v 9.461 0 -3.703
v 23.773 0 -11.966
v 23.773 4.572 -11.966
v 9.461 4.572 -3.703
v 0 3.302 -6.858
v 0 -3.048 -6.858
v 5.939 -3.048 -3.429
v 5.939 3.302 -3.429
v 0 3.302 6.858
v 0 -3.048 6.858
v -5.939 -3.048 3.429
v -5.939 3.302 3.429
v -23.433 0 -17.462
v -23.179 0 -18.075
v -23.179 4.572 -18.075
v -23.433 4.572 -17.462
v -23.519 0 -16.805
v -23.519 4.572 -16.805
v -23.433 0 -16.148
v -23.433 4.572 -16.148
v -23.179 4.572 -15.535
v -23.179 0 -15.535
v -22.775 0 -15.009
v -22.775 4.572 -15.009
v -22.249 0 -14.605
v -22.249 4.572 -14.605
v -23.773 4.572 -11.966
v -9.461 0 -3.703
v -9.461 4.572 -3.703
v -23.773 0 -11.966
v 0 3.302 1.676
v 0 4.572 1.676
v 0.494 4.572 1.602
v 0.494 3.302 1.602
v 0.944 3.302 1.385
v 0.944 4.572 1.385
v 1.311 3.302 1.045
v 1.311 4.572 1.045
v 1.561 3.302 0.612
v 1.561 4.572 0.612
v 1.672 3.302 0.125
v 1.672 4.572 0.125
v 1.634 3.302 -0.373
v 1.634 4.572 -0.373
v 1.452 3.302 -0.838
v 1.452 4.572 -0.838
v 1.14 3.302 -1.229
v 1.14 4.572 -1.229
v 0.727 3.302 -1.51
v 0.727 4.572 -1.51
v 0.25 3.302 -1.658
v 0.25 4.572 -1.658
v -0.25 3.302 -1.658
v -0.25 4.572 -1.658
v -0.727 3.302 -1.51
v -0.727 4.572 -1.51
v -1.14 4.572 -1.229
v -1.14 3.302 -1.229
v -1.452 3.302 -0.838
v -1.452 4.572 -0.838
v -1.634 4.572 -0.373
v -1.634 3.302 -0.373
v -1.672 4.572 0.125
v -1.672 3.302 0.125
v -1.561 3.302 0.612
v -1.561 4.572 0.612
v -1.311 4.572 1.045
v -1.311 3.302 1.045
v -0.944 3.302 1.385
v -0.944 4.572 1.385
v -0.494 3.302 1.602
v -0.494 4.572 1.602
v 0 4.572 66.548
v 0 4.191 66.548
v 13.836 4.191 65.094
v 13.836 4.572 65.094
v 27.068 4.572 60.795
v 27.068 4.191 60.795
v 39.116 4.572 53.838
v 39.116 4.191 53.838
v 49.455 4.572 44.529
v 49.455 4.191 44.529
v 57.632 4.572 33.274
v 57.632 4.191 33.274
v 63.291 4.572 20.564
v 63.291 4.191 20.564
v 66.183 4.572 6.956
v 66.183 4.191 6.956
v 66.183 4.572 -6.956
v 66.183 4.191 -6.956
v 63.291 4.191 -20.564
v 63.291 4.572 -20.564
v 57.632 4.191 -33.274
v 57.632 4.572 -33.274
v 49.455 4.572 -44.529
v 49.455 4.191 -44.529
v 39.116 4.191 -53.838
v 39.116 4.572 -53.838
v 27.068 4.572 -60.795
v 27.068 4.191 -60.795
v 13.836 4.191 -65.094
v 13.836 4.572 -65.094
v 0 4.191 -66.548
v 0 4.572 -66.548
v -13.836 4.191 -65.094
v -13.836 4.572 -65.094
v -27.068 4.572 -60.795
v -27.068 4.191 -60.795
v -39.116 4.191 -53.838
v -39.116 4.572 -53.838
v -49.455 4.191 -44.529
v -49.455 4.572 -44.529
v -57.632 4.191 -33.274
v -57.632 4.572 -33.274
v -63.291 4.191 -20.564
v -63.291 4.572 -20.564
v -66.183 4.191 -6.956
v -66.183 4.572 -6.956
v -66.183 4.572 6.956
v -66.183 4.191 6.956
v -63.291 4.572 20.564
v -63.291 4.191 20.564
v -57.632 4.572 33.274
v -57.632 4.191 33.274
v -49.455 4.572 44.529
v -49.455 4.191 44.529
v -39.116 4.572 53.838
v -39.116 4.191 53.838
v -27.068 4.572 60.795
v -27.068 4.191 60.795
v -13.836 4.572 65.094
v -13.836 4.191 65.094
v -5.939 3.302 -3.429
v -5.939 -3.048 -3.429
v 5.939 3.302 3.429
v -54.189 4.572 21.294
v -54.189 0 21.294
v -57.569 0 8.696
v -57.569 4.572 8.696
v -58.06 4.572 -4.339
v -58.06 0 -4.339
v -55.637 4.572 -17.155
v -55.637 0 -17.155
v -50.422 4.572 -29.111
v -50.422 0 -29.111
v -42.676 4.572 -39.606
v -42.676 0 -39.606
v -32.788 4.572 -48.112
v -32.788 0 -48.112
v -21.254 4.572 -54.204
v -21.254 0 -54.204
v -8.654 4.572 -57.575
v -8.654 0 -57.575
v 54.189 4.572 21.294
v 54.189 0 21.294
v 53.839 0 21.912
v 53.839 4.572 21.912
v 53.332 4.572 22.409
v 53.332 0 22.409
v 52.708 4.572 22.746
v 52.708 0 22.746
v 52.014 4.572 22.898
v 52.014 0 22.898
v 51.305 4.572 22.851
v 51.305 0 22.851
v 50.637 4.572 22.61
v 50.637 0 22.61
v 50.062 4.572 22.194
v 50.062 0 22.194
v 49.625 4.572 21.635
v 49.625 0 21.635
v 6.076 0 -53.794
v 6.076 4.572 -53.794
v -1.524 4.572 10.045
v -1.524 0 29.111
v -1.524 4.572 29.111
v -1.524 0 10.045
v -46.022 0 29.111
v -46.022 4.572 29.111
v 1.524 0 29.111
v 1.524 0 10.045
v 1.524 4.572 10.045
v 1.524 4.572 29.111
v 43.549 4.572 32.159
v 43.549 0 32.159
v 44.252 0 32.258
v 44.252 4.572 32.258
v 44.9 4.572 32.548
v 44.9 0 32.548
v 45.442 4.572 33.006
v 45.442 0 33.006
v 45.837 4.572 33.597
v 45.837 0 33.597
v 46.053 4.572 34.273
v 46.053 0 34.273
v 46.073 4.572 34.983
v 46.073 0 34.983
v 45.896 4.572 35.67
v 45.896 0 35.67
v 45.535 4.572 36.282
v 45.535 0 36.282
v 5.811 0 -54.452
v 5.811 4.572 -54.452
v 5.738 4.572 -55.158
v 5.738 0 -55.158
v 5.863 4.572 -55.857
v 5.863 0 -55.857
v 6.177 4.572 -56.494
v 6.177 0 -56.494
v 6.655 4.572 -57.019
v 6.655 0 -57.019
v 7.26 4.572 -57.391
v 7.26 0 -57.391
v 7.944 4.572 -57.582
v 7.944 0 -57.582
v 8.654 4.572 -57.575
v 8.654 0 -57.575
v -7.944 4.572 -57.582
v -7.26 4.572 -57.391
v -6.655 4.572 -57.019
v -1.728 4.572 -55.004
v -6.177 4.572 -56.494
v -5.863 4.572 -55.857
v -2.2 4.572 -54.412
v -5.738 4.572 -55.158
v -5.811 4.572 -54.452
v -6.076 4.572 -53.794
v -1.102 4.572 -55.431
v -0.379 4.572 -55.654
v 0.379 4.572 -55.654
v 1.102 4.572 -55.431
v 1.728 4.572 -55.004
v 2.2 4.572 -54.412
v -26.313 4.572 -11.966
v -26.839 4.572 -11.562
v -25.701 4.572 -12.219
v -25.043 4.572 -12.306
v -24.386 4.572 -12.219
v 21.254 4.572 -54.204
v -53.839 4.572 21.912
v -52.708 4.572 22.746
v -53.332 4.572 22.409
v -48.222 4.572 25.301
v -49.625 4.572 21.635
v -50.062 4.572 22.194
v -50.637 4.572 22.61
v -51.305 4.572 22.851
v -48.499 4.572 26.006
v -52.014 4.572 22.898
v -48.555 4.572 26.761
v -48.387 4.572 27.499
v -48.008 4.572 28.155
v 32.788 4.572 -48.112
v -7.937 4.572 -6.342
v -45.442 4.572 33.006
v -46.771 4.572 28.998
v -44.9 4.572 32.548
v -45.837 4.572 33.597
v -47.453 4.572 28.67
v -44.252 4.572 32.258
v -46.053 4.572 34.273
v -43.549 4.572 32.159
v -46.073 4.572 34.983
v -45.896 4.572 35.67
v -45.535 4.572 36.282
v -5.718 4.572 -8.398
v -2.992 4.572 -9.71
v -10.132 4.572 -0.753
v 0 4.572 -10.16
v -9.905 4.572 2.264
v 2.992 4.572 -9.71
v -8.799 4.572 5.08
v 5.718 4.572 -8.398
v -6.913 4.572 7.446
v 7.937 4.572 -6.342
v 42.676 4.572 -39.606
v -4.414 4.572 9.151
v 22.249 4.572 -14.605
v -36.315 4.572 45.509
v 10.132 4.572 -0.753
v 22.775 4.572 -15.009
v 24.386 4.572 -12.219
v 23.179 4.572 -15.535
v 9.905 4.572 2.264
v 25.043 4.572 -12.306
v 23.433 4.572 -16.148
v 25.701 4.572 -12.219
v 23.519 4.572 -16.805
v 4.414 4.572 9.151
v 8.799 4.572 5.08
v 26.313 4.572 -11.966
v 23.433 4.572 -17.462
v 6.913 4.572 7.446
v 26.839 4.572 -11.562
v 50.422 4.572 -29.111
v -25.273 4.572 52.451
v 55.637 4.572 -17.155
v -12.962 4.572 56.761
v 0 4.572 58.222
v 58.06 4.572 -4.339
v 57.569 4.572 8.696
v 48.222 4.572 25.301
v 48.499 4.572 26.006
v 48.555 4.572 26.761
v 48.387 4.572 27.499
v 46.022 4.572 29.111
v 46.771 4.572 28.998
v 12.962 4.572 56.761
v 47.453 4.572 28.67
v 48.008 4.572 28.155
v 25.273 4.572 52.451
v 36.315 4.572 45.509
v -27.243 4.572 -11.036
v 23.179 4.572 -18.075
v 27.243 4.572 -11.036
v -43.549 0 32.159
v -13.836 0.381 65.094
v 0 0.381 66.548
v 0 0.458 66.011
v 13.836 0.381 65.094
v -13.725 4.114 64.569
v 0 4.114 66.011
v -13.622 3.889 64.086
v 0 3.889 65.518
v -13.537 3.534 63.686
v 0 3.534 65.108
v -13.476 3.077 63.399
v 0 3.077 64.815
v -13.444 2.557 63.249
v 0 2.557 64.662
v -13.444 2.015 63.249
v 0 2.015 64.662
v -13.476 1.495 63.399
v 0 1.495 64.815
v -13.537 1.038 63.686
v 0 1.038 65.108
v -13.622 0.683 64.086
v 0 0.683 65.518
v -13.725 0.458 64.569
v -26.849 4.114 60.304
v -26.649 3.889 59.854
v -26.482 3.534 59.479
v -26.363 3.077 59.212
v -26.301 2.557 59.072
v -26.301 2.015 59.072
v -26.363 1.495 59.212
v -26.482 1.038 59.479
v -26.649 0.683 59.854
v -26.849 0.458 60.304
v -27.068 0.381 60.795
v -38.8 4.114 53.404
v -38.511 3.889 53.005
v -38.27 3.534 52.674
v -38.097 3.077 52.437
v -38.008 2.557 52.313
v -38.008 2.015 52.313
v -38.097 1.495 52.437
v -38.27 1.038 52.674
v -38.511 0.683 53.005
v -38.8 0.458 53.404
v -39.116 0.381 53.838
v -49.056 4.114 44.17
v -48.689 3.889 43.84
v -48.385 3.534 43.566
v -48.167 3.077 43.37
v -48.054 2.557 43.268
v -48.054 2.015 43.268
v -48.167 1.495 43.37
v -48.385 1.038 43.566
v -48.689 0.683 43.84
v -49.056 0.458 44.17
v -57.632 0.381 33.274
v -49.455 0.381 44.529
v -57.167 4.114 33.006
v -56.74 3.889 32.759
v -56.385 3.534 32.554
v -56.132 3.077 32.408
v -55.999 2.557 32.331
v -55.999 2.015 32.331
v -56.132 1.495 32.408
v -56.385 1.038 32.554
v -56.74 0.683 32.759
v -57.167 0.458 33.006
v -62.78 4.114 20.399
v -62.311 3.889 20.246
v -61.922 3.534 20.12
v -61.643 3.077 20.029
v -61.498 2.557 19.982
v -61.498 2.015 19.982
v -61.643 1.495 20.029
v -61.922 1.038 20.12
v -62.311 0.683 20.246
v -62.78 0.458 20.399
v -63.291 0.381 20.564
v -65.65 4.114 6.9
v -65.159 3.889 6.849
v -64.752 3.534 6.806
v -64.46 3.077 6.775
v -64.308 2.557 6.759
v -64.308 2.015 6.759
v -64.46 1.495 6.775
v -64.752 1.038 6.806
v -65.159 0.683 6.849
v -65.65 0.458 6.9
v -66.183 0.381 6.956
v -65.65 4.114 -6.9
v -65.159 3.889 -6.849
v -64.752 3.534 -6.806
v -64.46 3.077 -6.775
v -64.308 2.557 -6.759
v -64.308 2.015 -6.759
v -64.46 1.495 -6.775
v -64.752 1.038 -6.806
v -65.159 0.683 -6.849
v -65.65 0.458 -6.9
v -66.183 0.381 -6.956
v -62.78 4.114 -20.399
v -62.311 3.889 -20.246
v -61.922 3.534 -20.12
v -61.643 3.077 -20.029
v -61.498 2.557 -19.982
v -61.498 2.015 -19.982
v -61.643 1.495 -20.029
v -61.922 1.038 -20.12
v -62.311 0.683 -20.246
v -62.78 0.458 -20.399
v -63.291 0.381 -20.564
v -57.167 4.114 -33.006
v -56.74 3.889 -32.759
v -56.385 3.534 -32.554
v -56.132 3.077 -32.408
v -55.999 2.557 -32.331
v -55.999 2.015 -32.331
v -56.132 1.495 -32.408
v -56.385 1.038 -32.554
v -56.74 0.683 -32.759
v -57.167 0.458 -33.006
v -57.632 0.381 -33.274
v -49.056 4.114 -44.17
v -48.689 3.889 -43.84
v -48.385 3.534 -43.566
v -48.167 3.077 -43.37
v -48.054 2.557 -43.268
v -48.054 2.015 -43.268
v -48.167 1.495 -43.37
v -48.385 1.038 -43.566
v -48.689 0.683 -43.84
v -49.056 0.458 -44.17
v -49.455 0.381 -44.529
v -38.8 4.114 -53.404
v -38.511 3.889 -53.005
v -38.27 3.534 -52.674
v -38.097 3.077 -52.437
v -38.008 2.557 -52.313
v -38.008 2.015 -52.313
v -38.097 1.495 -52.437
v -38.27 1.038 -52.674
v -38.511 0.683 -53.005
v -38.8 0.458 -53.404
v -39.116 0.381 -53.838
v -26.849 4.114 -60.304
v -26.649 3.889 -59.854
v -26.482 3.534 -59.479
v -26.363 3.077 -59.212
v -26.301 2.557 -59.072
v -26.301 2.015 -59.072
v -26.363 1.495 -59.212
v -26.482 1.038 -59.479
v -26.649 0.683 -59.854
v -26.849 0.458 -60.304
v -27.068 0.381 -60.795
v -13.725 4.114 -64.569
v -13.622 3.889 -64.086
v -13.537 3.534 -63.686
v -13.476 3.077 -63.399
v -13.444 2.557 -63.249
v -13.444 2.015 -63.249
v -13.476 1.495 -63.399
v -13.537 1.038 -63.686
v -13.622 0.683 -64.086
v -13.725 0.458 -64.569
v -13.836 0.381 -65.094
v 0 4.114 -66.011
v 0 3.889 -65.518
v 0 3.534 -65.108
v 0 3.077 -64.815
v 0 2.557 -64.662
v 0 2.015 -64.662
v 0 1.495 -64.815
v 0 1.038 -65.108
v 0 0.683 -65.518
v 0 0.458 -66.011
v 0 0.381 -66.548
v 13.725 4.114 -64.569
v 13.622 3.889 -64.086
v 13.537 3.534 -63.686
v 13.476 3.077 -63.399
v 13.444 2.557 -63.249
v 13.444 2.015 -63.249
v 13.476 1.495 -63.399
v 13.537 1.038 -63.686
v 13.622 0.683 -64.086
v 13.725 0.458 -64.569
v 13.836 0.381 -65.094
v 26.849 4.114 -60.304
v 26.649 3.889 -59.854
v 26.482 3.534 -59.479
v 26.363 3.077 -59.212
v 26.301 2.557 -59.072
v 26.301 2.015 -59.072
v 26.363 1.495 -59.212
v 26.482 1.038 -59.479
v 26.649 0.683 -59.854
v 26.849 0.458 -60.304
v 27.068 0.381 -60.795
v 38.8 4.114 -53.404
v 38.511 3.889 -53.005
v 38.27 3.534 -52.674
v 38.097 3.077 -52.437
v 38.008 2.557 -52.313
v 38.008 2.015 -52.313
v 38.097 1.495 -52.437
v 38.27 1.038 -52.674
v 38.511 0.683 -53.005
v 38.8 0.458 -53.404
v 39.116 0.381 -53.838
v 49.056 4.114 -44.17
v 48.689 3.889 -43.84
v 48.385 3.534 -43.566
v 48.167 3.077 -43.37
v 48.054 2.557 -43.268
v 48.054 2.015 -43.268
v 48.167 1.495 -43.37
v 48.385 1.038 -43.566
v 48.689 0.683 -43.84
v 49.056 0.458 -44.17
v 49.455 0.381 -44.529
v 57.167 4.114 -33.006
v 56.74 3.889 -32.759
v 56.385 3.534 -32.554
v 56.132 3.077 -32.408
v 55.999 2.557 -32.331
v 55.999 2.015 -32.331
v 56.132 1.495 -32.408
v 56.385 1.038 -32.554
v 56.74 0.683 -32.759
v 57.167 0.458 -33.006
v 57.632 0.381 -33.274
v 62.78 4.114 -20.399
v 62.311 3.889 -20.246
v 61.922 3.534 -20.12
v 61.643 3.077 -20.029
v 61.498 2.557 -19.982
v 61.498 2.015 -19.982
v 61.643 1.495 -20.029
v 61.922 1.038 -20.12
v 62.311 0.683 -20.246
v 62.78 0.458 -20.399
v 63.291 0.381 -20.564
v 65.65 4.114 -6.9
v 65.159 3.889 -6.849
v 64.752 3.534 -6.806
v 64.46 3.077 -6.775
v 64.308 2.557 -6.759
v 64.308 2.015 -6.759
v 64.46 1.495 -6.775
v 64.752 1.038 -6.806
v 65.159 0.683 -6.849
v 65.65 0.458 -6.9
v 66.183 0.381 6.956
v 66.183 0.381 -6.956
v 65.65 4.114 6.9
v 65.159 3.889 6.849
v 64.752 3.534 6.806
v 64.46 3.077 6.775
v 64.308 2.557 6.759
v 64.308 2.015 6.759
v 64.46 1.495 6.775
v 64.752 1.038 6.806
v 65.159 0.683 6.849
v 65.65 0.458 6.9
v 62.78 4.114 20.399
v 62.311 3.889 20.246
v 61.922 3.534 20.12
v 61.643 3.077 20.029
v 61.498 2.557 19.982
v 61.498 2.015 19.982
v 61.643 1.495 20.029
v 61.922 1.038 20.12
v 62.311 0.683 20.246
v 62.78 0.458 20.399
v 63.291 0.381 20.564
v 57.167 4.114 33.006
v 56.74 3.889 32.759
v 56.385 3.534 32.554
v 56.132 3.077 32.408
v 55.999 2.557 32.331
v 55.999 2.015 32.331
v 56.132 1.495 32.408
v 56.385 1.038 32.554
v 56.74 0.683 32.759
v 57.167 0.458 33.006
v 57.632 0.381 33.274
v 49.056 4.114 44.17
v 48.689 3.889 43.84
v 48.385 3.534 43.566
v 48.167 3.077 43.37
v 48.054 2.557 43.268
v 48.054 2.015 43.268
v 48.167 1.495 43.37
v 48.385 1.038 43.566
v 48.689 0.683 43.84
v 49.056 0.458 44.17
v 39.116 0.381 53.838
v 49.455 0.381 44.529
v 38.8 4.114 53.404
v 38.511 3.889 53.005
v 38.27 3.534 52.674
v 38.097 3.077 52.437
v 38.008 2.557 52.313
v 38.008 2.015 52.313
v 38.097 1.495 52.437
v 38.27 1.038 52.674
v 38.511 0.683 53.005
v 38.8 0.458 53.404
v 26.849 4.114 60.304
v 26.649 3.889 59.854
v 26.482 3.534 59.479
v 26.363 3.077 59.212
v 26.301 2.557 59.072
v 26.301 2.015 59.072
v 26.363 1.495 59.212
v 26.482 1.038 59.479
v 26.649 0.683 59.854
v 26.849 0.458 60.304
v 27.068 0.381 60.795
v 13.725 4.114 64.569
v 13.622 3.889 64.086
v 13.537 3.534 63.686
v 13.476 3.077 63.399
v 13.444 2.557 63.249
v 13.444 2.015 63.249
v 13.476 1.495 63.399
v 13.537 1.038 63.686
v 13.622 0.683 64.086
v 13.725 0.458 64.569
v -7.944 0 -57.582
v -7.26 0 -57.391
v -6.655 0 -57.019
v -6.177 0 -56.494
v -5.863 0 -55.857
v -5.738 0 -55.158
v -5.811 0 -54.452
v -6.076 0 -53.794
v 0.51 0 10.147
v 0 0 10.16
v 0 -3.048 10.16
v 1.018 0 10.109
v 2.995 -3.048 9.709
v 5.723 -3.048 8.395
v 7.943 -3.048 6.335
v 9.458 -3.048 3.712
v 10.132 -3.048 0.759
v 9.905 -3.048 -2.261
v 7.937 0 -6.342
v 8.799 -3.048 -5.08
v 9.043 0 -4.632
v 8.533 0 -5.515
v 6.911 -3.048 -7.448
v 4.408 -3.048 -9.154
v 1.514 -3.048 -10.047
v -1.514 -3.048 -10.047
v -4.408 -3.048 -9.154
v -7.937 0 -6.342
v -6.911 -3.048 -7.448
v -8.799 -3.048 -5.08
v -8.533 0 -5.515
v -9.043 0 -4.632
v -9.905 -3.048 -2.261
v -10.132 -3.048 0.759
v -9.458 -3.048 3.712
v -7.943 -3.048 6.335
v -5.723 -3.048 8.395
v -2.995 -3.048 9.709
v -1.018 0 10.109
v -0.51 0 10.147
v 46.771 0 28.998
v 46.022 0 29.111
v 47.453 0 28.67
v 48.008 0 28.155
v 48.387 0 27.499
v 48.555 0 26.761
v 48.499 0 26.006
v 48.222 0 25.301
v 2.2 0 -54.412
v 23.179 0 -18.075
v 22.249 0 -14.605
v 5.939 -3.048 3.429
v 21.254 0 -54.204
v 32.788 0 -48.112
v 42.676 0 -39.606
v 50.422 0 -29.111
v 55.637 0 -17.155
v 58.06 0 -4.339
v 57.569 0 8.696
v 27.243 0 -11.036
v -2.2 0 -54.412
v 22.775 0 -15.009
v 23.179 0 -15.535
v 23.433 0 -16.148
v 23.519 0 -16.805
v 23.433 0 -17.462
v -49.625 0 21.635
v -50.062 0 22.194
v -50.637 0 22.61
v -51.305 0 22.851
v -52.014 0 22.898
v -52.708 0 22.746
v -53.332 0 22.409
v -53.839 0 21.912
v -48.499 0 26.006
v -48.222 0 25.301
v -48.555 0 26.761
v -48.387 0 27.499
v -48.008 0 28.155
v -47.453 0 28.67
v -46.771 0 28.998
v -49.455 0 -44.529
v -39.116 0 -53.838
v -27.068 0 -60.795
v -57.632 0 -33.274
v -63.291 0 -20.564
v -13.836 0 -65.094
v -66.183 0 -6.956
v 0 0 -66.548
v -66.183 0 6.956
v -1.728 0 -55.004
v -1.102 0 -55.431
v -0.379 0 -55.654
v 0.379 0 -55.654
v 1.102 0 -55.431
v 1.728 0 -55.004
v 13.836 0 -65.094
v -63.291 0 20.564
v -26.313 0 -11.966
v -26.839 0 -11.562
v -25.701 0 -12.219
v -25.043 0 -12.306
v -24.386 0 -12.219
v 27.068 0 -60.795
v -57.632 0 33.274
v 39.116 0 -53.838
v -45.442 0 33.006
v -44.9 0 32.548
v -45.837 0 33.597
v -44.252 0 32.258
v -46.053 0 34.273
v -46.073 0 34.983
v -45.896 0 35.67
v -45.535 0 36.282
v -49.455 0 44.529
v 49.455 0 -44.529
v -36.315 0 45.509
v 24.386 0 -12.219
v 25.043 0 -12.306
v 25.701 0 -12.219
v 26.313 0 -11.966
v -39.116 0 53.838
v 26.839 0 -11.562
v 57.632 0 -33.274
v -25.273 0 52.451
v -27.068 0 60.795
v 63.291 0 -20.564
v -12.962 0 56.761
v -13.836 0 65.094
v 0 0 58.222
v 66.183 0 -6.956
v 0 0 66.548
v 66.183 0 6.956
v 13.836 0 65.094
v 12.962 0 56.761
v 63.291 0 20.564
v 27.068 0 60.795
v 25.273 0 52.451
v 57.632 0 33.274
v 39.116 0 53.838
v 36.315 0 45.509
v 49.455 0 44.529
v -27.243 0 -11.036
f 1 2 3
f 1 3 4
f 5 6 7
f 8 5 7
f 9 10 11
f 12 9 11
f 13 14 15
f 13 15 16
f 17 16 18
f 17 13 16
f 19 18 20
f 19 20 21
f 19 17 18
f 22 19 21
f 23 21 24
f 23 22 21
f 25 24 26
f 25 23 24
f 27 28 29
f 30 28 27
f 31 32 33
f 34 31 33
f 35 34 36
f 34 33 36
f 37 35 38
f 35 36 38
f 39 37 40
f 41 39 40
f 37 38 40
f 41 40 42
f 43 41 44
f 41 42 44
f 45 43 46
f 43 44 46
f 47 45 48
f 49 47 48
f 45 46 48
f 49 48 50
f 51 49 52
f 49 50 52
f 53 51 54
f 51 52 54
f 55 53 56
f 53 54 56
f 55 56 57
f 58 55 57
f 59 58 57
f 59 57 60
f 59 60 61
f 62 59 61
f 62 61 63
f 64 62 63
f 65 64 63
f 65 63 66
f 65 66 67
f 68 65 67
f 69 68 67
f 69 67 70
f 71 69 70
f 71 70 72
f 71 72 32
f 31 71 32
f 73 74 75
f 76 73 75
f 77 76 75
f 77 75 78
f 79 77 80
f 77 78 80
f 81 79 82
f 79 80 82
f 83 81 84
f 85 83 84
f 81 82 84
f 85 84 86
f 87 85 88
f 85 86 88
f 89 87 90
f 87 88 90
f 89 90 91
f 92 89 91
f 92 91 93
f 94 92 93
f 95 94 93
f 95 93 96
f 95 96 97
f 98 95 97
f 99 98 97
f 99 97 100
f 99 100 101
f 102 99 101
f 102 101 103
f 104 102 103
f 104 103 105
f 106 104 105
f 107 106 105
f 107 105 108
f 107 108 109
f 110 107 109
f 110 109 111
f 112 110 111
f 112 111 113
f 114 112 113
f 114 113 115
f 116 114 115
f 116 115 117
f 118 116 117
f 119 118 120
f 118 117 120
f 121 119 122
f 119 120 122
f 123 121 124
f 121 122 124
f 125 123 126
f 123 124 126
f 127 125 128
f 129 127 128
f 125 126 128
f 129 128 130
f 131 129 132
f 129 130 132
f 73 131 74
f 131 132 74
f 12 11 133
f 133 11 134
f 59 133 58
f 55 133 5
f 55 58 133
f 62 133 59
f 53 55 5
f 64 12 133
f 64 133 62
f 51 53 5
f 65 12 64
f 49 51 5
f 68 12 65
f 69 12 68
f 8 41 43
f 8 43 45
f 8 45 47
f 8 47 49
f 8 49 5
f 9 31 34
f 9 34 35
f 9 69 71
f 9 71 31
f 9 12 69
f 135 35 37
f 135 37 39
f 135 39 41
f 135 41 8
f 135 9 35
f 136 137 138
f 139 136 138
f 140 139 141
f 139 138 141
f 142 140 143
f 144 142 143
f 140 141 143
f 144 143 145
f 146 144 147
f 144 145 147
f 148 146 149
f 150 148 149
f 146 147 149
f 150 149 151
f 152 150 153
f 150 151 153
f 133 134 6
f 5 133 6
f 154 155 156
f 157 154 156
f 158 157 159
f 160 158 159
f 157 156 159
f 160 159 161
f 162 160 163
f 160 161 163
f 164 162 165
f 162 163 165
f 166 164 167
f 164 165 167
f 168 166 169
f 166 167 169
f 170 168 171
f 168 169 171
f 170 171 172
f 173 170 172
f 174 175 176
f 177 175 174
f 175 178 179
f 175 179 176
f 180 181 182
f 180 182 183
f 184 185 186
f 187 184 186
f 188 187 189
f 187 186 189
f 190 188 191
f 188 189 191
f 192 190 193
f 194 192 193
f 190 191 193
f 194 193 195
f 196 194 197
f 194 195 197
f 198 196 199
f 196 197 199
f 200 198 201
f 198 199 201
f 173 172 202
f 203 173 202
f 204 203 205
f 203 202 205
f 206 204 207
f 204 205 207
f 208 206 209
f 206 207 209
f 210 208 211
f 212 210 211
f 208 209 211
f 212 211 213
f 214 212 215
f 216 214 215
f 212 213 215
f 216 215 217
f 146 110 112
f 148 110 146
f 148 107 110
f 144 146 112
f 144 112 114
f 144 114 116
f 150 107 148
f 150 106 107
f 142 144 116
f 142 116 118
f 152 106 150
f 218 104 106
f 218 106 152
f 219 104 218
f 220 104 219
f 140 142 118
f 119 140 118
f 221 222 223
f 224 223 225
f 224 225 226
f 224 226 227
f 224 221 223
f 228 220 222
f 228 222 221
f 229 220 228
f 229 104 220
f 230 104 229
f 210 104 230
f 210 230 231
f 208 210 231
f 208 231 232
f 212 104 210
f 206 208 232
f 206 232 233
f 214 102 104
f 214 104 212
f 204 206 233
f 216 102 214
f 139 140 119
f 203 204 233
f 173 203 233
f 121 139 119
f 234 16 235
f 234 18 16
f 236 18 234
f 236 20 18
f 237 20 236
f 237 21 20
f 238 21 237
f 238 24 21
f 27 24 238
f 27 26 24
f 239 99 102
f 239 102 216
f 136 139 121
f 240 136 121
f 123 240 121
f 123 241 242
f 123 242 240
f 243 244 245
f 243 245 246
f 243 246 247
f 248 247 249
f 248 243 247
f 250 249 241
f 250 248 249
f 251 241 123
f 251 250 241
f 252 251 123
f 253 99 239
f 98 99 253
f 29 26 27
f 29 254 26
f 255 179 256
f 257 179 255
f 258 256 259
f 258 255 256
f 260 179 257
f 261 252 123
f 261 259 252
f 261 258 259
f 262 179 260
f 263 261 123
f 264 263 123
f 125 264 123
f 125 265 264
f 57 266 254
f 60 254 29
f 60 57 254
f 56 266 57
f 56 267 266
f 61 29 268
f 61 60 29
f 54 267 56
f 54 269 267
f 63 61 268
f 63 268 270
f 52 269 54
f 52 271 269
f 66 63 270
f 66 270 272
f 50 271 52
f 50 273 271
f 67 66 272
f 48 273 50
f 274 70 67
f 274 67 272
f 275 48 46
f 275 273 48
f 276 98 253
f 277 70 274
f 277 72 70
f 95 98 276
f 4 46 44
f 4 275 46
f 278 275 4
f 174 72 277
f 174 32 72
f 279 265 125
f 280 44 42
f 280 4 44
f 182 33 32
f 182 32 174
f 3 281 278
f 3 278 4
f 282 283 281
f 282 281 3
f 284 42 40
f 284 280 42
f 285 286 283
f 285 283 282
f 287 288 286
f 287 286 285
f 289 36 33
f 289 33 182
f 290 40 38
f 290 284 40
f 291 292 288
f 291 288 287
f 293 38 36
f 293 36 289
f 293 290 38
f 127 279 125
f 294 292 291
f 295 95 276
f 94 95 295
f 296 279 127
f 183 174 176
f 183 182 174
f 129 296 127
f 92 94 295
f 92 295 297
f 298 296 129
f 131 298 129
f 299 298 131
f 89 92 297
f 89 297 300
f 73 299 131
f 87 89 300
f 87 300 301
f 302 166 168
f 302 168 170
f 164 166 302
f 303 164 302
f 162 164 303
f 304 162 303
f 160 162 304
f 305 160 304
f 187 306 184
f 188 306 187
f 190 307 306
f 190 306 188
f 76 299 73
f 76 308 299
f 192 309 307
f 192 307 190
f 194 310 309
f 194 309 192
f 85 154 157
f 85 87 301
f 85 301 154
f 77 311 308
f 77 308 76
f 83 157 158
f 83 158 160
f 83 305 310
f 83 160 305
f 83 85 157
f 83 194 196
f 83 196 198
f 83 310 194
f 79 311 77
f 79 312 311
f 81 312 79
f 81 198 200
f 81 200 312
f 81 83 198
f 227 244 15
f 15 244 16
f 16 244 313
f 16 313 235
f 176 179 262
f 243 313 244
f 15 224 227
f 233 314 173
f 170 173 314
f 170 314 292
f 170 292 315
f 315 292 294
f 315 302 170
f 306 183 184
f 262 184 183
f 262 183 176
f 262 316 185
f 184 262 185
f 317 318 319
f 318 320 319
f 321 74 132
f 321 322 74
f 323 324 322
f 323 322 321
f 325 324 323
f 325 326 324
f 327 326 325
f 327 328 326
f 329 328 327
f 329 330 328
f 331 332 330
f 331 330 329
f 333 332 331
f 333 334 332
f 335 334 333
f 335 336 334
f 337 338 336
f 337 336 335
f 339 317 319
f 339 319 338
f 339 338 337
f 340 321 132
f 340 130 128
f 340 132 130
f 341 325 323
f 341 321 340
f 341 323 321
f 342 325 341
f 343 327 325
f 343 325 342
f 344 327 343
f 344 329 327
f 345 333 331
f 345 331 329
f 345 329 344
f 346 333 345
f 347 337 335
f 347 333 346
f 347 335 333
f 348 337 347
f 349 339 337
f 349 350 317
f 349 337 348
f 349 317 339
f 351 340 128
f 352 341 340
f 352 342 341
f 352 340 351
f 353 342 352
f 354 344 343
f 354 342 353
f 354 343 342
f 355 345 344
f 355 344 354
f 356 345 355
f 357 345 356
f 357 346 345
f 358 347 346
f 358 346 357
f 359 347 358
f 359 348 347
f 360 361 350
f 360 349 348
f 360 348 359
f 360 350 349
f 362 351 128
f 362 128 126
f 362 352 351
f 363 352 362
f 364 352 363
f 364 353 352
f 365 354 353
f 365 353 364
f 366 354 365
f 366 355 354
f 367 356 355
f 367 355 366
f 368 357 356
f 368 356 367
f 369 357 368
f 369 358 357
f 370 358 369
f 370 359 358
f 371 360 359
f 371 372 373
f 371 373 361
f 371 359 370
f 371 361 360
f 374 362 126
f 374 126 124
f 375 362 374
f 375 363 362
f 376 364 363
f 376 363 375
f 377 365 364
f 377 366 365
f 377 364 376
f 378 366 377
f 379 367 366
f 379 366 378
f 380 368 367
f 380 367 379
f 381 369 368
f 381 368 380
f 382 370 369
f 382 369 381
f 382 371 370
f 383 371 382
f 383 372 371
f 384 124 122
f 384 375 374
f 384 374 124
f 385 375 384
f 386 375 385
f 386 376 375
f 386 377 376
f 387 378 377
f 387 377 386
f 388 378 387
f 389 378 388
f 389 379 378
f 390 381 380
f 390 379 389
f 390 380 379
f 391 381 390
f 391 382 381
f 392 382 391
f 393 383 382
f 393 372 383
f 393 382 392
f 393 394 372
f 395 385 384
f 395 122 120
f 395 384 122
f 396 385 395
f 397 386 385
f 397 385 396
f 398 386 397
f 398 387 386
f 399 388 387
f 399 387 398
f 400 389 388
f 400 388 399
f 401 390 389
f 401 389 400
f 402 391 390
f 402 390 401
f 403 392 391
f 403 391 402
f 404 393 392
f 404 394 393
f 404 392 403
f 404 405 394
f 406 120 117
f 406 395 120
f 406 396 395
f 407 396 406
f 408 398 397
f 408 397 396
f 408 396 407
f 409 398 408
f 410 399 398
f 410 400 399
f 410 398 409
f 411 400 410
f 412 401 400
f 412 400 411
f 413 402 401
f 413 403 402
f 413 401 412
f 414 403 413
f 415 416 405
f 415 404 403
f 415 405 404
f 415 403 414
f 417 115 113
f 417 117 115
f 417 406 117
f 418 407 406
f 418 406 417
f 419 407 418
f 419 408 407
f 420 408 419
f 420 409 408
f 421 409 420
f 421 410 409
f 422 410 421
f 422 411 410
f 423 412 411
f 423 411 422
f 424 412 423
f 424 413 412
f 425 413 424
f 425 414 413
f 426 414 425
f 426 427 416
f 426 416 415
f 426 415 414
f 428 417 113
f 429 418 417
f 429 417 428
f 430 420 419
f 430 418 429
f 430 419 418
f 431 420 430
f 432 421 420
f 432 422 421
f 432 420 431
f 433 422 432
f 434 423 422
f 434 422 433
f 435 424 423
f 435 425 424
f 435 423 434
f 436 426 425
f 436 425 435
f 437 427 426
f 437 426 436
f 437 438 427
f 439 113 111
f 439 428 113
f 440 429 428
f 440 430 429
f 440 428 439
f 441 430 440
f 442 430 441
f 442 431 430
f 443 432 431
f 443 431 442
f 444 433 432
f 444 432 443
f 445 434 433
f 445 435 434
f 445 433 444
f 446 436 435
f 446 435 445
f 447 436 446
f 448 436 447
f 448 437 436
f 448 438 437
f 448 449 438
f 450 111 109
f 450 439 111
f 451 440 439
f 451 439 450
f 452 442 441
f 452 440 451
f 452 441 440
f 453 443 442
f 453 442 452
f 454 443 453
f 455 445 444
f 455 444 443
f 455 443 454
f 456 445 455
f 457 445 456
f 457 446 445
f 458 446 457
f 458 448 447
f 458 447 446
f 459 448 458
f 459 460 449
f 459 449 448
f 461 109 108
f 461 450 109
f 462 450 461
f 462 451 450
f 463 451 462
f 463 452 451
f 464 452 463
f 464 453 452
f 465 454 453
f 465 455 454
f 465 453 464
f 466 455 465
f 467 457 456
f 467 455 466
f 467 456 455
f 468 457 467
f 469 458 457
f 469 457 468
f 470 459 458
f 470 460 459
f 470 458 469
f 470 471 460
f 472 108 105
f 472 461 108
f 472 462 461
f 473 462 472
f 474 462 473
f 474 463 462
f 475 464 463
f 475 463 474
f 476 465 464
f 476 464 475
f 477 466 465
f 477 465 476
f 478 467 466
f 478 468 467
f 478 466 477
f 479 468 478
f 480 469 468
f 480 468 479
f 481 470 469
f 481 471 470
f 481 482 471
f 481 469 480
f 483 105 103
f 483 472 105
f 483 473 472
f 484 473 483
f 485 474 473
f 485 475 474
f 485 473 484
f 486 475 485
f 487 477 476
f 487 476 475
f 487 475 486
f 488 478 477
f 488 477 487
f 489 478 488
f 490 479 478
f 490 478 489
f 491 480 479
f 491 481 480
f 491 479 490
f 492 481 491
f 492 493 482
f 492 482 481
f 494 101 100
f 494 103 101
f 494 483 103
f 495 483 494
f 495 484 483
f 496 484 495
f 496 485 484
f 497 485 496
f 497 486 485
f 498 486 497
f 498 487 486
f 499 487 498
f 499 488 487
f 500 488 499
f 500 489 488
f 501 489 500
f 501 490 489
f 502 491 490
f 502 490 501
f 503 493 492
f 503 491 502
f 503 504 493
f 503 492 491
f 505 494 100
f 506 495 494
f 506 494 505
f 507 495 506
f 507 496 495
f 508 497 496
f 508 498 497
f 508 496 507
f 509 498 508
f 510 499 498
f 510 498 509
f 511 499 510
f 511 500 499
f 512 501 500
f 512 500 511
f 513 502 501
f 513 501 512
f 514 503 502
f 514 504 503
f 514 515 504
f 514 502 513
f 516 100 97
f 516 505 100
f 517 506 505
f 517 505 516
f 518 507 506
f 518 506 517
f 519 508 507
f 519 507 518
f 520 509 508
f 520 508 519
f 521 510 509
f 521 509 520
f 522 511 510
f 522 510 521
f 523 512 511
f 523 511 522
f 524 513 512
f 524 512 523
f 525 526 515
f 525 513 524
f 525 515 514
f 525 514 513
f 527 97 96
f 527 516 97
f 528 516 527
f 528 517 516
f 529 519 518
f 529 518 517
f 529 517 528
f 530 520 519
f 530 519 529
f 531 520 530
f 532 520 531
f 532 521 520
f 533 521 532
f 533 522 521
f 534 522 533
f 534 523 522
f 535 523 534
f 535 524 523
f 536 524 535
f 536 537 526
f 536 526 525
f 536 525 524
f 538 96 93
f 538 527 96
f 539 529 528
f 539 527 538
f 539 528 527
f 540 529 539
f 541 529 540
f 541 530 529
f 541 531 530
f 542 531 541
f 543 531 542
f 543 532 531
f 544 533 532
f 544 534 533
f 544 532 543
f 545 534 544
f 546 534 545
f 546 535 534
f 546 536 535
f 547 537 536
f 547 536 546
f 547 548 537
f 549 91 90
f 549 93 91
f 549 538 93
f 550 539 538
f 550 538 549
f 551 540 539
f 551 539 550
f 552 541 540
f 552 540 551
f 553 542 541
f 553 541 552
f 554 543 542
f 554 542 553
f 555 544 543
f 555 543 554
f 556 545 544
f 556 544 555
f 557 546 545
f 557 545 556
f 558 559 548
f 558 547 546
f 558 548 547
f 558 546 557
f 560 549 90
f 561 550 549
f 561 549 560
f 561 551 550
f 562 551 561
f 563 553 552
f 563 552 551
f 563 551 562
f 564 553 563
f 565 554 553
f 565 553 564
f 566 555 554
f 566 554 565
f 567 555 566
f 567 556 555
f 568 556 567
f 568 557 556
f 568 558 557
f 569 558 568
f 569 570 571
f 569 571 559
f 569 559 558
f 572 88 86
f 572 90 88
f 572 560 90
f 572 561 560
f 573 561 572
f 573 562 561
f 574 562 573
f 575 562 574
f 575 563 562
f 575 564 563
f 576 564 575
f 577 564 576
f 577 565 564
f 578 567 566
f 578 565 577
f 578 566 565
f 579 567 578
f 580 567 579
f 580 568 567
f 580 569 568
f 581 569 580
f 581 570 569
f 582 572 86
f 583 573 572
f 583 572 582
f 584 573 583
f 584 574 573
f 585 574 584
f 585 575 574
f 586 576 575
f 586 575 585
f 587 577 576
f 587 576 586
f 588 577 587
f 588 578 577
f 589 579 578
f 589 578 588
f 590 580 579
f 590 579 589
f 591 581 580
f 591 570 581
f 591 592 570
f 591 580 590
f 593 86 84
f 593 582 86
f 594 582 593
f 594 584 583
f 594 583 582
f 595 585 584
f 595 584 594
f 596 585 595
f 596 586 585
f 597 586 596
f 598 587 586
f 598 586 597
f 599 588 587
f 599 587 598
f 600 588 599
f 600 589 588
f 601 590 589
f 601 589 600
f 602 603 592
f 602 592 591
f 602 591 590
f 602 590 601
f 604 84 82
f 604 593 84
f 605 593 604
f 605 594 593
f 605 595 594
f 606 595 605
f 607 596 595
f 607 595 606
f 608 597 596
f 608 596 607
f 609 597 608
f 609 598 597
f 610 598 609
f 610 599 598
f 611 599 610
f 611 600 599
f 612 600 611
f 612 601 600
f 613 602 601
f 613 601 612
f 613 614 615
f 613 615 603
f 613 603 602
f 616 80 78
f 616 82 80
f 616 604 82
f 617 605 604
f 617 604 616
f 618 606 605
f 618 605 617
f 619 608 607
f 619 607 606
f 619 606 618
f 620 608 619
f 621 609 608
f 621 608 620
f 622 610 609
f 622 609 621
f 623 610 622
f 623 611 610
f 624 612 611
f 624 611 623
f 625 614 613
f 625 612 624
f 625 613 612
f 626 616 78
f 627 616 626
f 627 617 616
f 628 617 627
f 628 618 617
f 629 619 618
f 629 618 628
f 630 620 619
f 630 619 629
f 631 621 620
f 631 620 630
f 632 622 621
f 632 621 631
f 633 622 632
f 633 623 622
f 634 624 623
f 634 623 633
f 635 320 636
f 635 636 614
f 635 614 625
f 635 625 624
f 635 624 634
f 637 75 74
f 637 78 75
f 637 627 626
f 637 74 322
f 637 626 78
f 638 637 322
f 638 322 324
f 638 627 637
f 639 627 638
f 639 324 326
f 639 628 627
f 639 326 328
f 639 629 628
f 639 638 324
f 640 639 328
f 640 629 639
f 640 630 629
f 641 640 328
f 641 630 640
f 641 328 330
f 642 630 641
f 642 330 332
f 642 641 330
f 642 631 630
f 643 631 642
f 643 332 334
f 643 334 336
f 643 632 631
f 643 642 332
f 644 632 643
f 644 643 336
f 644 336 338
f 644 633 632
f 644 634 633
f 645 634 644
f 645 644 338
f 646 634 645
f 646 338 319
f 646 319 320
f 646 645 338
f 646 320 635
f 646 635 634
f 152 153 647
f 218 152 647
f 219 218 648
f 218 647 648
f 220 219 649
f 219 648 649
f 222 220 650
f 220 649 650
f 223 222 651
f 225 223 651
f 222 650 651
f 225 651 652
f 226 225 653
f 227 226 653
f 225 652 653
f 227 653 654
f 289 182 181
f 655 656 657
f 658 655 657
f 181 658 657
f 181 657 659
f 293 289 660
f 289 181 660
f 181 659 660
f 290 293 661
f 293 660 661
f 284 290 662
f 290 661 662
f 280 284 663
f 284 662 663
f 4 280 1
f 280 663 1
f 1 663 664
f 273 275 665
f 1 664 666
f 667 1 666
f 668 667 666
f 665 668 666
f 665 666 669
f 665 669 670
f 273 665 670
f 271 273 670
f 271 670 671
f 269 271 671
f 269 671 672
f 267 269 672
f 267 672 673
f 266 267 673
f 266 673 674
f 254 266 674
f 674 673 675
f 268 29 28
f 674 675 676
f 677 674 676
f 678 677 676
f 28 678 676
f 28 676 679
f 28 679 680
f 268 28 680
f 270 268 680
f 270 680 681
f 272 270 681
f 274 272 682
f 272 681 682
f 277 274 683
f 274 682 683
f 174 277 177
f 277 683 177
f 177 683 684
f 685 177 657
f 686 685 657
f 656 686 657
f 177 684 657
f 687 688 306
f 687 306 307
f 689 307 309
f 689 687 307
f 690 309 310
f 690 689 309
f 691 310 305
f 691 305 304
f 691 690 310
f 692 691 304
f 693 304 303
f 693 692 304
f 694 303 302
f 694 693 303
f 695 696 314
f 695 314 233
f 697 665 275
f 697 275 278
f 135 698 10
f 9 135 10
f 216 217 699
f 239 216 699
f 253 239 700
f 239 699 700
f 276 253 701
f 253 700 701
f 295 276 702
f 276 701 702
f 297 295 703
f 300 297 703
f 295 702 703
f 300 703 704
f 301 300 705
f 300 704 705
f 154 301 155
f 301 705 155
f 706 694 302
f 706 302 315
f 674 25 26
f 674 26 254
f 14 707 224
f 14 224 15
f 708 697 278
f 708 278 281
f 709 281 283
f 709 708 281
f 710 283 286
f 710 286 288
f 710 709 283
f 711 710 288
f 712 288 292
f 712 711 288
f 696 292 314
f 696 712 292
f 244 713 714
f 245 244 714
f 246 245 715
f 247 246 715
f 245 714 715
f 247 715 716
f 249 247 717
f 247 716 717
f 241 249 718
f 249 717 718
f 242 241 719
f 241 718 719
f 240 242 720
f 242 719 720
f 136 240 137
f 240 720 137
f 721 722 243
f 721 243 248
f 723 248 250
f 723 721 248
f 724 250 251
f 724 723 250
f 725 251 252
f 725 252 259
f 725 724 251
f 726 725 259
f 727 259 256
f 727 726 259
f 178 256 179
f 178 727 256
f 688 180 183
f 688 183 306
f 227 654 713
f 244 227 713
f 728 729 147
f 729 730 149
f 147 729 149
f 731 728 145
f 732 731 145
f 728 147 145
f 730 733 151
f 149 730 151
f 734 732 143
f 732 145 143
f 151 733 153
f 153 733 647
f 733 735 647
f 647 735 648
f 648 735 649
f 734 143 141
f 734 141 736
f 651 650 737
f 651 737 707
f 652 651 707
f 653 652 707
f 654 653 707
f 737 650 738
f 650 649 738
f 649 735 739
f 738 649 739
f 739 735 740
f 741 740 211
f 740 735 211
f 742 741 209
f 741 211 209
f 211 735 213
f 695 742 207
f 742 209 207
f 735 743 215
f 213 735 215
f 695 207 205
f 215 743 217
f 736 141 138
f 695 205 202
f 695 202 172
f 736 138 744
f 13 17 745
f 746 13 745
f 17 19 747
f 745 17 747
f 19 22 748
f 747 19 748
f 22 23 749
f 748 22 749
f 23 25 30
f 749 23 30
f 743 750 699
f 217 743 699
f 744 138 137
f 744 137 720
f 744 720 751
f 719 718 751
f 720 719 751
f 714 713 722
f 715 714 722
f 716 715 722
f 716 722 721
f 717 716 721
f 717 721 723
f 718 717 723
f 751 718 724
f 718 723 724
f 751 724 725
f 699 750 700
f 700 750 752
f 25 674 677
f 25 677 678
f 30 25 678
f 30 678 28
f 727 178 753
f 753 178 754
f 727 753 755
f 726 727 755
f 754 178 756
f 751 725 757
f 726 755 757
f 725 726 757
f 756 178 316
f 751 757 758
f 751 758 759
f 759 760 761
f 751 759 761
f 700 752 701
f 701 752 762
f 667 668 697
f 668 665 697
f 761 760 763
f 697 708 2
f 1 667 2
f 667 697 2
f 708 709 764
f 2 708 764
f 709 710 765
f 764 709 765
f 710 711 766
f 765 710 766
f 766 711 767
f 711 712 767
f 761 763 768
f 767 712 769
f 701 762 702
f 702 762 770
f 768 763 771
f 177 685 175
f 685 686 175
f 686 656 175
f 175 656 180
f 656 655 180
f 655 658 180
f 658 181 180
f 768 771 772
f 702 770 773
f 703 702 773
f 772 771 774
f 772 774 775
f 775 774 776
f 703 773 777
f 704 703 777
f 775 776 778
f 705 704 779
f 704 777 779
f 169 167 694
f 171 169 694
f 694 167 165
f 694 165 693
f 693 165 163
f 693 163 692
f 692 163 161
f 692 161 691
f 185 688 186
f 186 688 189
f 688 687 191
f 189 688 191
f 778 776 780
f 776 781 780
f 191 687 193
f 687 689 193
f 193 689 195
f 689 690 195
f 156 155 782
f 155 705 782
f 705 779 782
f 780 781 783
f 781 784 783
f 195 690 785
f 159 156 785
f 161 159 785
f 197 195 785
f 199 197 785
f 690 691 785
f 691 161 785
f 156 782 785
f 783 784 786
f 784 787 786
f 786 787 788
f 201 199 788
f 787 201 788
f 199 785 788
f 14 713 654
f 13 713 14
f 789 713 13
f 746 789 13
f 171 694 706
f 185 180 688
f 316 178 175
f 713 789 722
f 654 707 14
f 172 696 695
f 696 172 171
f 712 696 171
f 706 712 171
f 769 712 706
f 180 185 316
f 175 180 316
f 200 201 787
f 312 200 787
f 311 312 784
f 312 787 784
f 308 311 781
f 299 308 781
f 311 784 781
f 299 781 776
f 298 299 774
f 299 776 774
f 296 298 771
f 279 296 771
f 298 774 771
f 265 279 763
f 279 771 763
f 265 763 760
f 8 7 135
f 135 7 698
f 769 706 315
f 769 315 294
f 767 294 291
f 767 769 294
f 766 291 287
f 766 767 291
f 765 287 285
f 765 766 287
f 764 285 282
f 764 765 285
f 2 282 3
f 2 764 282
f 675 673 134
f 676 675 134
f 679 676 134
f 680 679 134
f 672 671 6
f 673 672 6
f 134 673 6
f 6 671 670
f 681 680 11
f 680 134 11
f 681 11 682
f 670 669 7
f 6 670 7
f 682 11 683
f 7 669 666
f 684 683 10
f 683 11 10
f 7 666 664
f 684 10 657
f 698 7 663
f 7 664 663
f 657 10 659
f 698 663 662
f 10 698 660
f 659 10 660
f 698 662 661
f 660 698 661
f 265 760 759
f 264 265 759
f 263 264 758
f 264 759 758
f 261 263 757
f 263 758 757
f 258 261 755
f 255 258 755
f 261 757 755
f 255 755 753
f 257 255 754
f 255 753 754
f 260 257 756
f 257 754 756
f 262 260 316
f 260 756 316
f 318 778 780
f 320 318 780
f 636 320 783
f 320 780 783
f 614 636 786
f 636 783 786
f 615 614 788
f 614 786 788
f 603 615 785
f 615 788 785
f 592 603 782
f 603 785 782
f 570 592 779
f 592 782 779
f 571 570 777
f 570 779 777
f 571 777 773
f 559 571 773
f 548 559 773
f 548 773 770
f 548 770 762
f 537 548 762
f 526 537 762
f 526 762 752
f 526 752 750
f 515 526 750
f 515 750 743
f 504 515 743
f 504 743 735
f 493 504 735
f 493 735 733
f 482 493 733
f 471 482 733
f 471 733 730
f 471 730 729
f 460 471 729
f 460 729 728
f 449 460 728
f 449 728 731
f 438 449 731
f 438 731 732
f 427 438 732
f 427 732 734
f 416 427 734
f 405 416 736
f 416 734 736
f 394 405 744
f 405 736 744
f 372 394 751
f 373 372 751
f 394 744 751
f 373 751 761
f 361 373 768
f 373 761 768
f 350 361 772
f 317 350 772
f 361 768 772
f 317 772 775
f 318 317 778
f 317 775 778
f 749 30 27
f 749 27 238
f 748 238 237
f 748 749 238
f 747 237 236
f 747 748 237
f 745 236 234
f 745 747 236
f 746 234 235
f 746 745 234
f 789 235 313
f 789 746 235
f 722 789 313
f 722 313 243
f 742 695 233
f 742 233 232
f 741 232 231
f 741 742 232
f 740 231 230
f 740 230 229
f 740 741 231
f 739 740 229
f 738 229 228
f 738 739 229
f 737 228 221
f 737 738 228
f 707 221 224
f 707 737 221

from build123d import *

# Parameters (mm, degrees)
SKETCH1_R           = 66.548
BOSS_EXTRUDE1_DEPTH = 4.572
BOSS_EXTRUDE2_START = -7.62
SKETCH2_R           = 10.16
BOSS_EXTRUDE2_DEPTH = 7.62
SKETCH3_R           = 1.6764
CUT_EXTRUDE1_DEPTH  = 7.62
CUT_EXTRUDE2_DEPTH  = 6.35
SKETCH6_R           = 1.905


with BuildPart() as part:
    # Sketch1 → Boss-Extrude1 (new body)
    with BuildSketch(Plane(origin=(0, 0, 0), x_dir=(1, 0, 0), z_dir=(0, 1, 0))):
        with Locations(Location((0, 0, 0), (0, 0, 270))):
            Circle(SKETCH1_R)
        with BuildLine():
            Line((7.937268245, 6.342347578), (22.249217727, 14.605355465))
            ThreePointArc((22.249217727, 14.605355465), (23.432669326, 16.147659616), (23.178922253, 18.07505999))
            Line((23.178922253, 18.07505999), (2.199704526, 54.412130997))
            ThreePointArc((2.199704526, 54.412130997), (0, 55.682130997), (-2.199704526, 54.412130997))
            Line((-2.199704526, 54.412130997), (-23.178922253, 18.07505999))
            ThreePointArc((-23.178922253, 18.07505999), (-23.432669326, 16.147659616), (-22.249217727, 14.605355465))
            Line((-22.249217727, 14.605355465), (-7.937268245, 6.342347578))
            ThreePointArc((-7.937268245, 6.342347578), (-8.798818102, 5.08), (-9.461268245, 3.702702148))
            Line((-9.461268245, 3.702702148), (-23.773217727, 11.965710034))
            ThreePointArc((-23.773217727, 11.965710034), (-25.700618102, 12.219457107), (-27.242922253, 11.036005508))
            Line((-27.242922253, 11.036005508), (-48.22213998, -25.301065498))
            ThreePointArc((-48.22213998, -25.301065498), (-48.22213998, -27.841065498), (-46.022435454, -29.111065498))
            Line((-46.022435454, -29.111065498), (-1.524, -29.111065498))
            Line((-1.524, -29.111065498), (-1.524, -10.045049726))
            ThreePointArc((-1.524, -10.045049726), (0, -10.16), (1.524, -10.045049726))
            Line((1.524, -10.045049726), (1.524, -29.111065498))
            Line((1.524, -29.111065498), (46.022435454, -29.111065498))
            ThreePointArc((46.022435454, -29.111065498), (48.22213998, -27.841065498), (48.22213998, -25.301065498))
            Line((48.22213998, -25.301065498), (27.242922253, 11.036005508))
            ThreePointArc((27.242922253, 11.036005508), (25.700618102, 12.219457107), (23.773217727, 11.965710034))
            Line((23.773217727, 11.965710034), (9.461268245, 3.702702148))
            ThreePointArc((9.461268245, 3.702702148), (8.798818102, 5.08), (7.937268245, 6.342347578))
        make_face(mode=Mode.SUBTRACT)
        with BuildLine():
            Line((-6.076302105, 53.793667028), (-49.624833262, -21.63460153))
            ThreePointArc((-49.624833262, -21.63460153), (-52.01382357, -22.897538736), (-54.188569544, -21.293554624))
            ThreePointArc((-54.188569544, -21.293554624), (-50.421844506, 29.111065498), (-8.653525531, 57.575455132))
            ThreePointArc((-8.653525531, 57.575455132), (-6.177061556, 56.494061928), (-6.076302105, 53.793667028))
        make_face(mode=Mode.SUBTRACT)
        with BuildLine():
            Line((-43.548531156, -32.159065498), (43.548531156, -32.159065498))
            ThreePointArc((43.548531156, -32.159065498), (45.836762015, -33.596523192), (45.535044013, -36.281900508))
            ThreePointArc((45.535044013, -36.281900508), (0, -58.222130997), (-45.535044013, -36.281900508))
            ThreePointArc((-45.535044013, -36.281900508), (-45.836762015, -33.596523192), (-43.548531156, -32.159065498))
        make_face(mode=Mode.SUBTRACT)
        with BuildLine():
            Line((49.624833262, -21.63460153), (6.076302105, 53.793667028))
            ThreePointArc((6.076302105, 53.793667028), (6.177061556, 56.494061928), (8.653525531, 57.575455132))
            ThreePointArc((8.653525531, 57.575455132), (50.421844506, 29.111065498), (54.188569544, -21.293554624))
            ThreePointArc((54.188569544, -21.293554624), (52.01382357, -22.897538736), (49.624833262, -21.63460153))
        make_face(mode=Mode.SUBTRACT)
    extrude(amount=BOSS_EXTRUDE1_DEPTH)

    # Sketch2 → Boss-Extrude2 (add)
    with BuildSketch(Plane(origin=(0, 4.572, 0), x_dir=(1, 0, 0), z_dir=(0, 1, 0)).offset(BOSS_EXTRUDE2_START)):
        with Locations(Location((0, 0, 0), (0, 0, 270))):
            Circle(SKETCH2_R)
    extrude(amount=BOSS_EXTRUDE2_DEPTH)

    # Sketch3 → Cut-Extrude1 (cut)
    with BuildSketch(Plane(origin=(0, 4.572, 0), x_dir=(1, 0, 0), z_dir=(0, 1, 0))):
        with Locations(Location((0, 0, 0), (0, 0, 270))):
            Circle(SKETCH3_R)
    extrude(amount=-CUT_EXTRUDE1_DEPTH, mode=Mode.SUBTRACT)

    # Sketch4 → Cut-Extrude2 (cut)
    with BuildSketch(Plane.XZ.offset(3.048)):
        Polygon((0, 6.858), (-5.939202219, 3.429), (-5.939202219, -3.429), (0, -6.858), (5.939202219, -3.429), (5.939202219, 3.429), align=None)
    extrude(amount=-CUT_EXTRUDE2_DEPTH, mode=Mode.SUBTRACT)

    # Sketch6 → Cut-Revolve1 (revolve, cut)
    with BuildSketch(Plane(origin=(0, 0, 0), x_dir=(0, 0, -1), z_dir=(1, 0, 0)), mode=Mode.PRIVATE) as cut_revolve1_sk:
        with Locations((66.548, 2.286)):
            Circle(SKETCH6_R)
    revolve(cut_revolve1_sk.sketch.rotate(Axis((0, 8.629088399, 0), (0, -1, 0)), 180), axis=Axis((0, 8.629088399, 0), (0, -1, 0)), mode=Mode.SUBTRACT)


solid = part.part
